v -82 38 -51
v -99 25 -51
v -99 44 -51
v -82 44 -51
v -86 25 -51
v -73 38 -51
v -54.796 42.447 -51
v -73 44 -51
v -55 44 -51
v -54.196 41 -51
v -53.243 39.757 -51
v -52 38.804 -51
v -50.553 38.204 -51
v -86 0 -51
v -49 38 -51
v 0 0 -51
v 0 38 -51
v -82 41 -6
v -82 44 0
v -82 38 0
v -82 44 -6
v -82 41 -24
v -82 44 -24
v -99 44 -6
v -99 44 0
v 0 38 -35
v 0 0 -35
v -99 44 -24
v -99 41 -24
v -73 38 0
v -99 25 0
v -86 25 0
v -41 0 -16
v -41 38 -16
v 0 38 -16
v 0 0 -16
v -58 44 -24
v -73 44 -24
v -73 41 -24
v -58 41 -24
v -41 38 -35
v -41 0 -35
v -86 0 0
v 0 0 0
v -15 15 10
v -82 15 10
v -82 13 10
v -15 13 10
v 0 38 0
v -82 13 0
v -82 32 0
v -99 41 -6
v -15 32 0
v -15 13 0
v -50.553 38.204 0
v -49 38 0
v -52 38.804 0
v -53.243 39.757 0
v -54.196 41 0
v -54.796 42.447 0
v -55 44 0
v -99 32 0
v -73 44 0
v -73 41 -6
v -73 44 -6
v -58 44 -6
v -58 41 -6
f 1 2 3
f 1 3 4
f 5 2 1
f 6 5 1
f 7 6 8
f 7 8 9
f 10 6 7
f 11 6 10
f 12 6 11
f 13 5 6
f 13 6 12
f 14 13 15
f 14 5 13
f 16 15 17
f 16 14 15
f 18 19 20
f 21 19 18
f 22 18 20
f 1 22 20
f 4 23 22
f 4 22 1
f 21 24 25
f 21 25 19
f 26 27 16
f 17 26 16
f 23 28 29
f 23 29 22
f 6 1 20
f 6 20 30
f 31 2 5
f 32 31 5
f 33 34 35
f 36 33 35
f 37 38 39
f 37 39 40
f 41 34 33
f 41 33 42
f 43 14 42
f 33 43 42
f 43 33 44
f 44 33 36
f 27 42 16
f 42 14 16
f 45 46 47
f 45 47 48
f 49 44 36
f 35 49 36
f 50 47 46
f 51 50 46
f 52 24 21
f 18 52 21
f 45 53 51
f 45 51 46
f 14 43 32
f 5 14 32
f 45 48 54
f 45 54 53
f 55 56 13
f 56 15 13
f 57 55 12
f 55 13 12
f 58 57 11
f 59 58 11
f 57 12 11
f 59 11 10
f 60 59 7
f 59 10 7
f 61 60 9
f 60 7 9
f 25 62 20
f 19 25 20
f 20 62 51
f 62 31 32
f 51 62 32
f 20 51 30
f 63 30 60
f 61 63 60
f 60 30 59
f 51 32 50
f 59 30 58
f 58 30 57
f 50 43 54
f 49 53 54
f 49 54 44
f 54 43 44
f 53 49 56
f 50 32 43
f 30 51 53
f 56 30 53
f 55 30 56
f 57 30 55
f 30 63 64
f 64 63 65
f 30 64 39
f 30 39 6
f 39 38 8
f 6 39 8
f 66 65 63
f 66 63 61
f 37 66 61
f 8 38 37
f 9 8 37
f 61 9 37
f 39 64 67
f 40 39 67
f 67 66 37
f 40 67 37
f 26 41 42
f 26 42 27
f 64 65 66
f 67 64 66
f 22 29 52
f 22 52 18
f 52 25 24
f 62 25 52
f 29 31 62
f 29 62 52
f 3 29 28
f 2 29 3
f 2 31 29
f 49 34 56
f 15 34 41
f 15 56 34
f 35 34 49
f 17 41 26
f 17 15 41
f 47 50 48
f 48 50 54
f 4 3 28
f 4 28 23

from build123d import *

# Parameters (mm, degrees)
SCHIZZO1_W                   = 99
SCHIZZO1_H                   = 51
ESTRUSIONE_ESTRUSIONE1_DEPTH = 44
SCHIZZO2_W                   = 55
SCHIZZO2_H                   = 51
TAGLIO_ESTRUSIONE1_DEPTH     = 6
SCHIZZO3_W                   = 41
SCHIZZO3_H                   = 18
TAGLIO_ESTRUSIONE2_DEPTH     = 3
SCHIZZO4_W                   = 9
SCHIZZO4_H                   = 51
TAGLIO_ESTRUSIONE3_DEPTH     = 6
SCHIZZO5_W                   = 41
SCHIZZO5_H                   = 19
TAGLIO_ESTRUSIONE4_DEPTH     = 118.669027361
SCHIZZO6_W                   = 13
SCHIZZO6_H                   = 25
TAGLIO_ESTRUSIONE5_DEPTH     = 120.741387999
SCHIZZO7_W                   = 67
SCHIZZO7_H                   = 19
ESTRUSIONE_ESTRUSIONE2_DEPTH = 10
TAGLIO_ESTRUSIONE6_DEPTH     = 108.670794555
RACCORDO1_R                  = 6


with BuildPart() as part:
    # Schizzo1 → Estrusione-Estrusione1 (new body)
    with BuildSketch(Plane(origin=(0, 0, 0), x_dir=(1, 0, 0), z_dir=(0, 1, 0))):
        with Locations((-49.5, 25.5)):
            Rectangle(SCHIZZO1_W, SCHIZZO1_H)
    extrude(amount=ESTRUSIONE_ESTRUSIONE1_DEPTH)

    # Schizzo2 → Taglio-Estrusione1 (cut)
    with BuildSketch(Plane(origin=(0, 44, 0), x_dir=(1, 0, 0), z_dir=(0, 1, 0))):
        with Locations((-27.5, 25.5)):
            Rectangle(SCHIZZO2_W, SCHIZZO2_H)
    extrude(amount=-TAGLIO_ESTRUSIONE1_DEPTH, mode=Mode.SUBTRACT)

    # Schizzo3 → Taglio-Estrusione2 (cut)
    with BuildSketch(Plane(origin=(0, 44, 0), x_dir=(1, 0, 0), z_dir=(0, 1, 0))):
        with Locations((-78.5, 15)):
            Rectangle(SCHIZZO3_W, SCHIZZO3_H)
    extrude(amount=-TAGLIO_ESTRUSIONE2_DEPTH, mode=Mode.SUBTRACT)

    # Schizzo4 → Taglio-Estrusione3 (cut)
    with BuildSketch(Plane(origin=(0, 44, 0), x_dir=(1, 0, 0), z_dir=(0, 1, 0))):
        with Locations((-77.5, 25.5)):
            Rectangle(SCHIZZO4_W, SCHIZZO4_H)
    extrude(amount=-TAGLIO_ESTRUSIONE3_DEPTH, mode=Mode.SUBTRACT)

    # Schizzo5 → Taglio-Estrusione4 (cut, through all)
    with BuildSketch(Plane(origin=(0, 38, 0), x_dir=(1, 0, 0), z_dir=(0, 1, 0))):
        with Locations((-20.5, 25.5)):
            Rectangle(SCHIZZO5_W, SCHIZZO5_H)
    extrude(amount=-TAGLIO_ESTRUSIONE4_DEPTH, mode=Mode.SUBTRACT)

    # Schizzo6 → Taglio-Estrusione5 (cut, through all)
    with BuildSketch(Plane.XY):
        with Locations((-92.5, 12.5)):
            Rectangle(SCHIZZO6_W, SCHIZZO6_H)
    extrude(amount=-TAGLIO_ESTRUSIONE5_DEPTH, mode=Mode.SUBTRACT)

    # Schizzo7 → Estrusione-Estrusione2 (add)
    with BuildSketch(Plane.XY):
        with Locations((-48.5, 22.5)):
            Rectangle(SCHIZZO7_W, SCHIZZO7_H)
    extrude(amount=ESTRUSIONE_ESTRUSIONE2_DEPTH)

    # Schizzo8 → Taglio-Estrusione6 (cut, through all)
    with BuildSketch(Plane(origin=(-15, 0, 0), x_dir=(0, 0, -1), z_dir=(1, 0, 0))):
        Polygon((0, 32), (-10, 15), (-10, 32), align=None)
    extrude(amount=-TAGLIO_ESTRUSIONE6_DEPTH, mode=Mode.SUBTRACT)

    # Raccordo1
    raccordo1_edges = [part.edges().sort_by_distance(p)[0] for p in [
        (-55, 38, -25.5),
    ]]
    fillet(raccordo1_edges, radius=RACCORDO1_R - 0.0001)  # a hair under: the kernel refuses the full size


solid = part.part
